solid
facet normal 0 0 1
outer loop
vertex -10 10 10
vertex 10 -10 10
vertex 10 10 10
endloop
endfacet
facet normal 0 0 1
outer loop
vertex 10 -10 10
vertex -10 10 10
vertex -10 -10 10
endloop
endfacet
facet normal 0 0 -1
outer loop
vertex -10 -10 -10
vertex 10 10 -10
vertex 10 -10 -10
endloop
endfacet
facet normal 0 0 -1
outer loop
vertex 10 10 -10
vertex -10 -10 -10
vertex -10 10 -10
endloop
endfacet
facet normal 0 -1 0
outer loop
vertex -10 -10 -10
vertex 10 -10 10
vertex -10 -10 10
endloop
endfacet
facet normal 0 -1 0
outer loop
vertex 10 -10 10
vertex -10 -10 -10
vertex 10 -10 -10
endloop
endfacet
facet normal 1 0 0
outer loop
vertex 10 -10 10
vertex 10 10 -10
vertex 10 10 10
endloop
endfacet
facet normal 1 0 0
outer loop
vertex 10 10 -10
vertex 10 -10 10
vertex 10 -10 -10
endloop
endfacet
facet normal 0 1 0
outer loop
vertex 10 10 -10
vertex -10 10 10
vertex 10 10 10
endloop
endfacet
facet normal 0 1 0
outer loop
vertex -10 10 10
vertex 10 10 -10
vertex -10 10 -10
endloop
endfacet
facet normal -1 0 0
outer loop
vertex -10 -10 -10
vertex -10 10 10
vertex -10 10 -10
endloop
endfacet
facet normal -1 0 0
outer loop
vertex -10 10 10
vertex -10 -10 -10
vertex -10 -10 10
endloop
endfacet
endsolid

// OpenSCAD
// Cubo centrado con color personalizado (#59c9a5)

// Parámetros
size = 20;

// Aplicar color (RGB normalizado de #59c9a5 → 0.349, 0.788, 0.647)
color([0.349, 0.788, 0.647])
cube([size, size, size], center = true);
